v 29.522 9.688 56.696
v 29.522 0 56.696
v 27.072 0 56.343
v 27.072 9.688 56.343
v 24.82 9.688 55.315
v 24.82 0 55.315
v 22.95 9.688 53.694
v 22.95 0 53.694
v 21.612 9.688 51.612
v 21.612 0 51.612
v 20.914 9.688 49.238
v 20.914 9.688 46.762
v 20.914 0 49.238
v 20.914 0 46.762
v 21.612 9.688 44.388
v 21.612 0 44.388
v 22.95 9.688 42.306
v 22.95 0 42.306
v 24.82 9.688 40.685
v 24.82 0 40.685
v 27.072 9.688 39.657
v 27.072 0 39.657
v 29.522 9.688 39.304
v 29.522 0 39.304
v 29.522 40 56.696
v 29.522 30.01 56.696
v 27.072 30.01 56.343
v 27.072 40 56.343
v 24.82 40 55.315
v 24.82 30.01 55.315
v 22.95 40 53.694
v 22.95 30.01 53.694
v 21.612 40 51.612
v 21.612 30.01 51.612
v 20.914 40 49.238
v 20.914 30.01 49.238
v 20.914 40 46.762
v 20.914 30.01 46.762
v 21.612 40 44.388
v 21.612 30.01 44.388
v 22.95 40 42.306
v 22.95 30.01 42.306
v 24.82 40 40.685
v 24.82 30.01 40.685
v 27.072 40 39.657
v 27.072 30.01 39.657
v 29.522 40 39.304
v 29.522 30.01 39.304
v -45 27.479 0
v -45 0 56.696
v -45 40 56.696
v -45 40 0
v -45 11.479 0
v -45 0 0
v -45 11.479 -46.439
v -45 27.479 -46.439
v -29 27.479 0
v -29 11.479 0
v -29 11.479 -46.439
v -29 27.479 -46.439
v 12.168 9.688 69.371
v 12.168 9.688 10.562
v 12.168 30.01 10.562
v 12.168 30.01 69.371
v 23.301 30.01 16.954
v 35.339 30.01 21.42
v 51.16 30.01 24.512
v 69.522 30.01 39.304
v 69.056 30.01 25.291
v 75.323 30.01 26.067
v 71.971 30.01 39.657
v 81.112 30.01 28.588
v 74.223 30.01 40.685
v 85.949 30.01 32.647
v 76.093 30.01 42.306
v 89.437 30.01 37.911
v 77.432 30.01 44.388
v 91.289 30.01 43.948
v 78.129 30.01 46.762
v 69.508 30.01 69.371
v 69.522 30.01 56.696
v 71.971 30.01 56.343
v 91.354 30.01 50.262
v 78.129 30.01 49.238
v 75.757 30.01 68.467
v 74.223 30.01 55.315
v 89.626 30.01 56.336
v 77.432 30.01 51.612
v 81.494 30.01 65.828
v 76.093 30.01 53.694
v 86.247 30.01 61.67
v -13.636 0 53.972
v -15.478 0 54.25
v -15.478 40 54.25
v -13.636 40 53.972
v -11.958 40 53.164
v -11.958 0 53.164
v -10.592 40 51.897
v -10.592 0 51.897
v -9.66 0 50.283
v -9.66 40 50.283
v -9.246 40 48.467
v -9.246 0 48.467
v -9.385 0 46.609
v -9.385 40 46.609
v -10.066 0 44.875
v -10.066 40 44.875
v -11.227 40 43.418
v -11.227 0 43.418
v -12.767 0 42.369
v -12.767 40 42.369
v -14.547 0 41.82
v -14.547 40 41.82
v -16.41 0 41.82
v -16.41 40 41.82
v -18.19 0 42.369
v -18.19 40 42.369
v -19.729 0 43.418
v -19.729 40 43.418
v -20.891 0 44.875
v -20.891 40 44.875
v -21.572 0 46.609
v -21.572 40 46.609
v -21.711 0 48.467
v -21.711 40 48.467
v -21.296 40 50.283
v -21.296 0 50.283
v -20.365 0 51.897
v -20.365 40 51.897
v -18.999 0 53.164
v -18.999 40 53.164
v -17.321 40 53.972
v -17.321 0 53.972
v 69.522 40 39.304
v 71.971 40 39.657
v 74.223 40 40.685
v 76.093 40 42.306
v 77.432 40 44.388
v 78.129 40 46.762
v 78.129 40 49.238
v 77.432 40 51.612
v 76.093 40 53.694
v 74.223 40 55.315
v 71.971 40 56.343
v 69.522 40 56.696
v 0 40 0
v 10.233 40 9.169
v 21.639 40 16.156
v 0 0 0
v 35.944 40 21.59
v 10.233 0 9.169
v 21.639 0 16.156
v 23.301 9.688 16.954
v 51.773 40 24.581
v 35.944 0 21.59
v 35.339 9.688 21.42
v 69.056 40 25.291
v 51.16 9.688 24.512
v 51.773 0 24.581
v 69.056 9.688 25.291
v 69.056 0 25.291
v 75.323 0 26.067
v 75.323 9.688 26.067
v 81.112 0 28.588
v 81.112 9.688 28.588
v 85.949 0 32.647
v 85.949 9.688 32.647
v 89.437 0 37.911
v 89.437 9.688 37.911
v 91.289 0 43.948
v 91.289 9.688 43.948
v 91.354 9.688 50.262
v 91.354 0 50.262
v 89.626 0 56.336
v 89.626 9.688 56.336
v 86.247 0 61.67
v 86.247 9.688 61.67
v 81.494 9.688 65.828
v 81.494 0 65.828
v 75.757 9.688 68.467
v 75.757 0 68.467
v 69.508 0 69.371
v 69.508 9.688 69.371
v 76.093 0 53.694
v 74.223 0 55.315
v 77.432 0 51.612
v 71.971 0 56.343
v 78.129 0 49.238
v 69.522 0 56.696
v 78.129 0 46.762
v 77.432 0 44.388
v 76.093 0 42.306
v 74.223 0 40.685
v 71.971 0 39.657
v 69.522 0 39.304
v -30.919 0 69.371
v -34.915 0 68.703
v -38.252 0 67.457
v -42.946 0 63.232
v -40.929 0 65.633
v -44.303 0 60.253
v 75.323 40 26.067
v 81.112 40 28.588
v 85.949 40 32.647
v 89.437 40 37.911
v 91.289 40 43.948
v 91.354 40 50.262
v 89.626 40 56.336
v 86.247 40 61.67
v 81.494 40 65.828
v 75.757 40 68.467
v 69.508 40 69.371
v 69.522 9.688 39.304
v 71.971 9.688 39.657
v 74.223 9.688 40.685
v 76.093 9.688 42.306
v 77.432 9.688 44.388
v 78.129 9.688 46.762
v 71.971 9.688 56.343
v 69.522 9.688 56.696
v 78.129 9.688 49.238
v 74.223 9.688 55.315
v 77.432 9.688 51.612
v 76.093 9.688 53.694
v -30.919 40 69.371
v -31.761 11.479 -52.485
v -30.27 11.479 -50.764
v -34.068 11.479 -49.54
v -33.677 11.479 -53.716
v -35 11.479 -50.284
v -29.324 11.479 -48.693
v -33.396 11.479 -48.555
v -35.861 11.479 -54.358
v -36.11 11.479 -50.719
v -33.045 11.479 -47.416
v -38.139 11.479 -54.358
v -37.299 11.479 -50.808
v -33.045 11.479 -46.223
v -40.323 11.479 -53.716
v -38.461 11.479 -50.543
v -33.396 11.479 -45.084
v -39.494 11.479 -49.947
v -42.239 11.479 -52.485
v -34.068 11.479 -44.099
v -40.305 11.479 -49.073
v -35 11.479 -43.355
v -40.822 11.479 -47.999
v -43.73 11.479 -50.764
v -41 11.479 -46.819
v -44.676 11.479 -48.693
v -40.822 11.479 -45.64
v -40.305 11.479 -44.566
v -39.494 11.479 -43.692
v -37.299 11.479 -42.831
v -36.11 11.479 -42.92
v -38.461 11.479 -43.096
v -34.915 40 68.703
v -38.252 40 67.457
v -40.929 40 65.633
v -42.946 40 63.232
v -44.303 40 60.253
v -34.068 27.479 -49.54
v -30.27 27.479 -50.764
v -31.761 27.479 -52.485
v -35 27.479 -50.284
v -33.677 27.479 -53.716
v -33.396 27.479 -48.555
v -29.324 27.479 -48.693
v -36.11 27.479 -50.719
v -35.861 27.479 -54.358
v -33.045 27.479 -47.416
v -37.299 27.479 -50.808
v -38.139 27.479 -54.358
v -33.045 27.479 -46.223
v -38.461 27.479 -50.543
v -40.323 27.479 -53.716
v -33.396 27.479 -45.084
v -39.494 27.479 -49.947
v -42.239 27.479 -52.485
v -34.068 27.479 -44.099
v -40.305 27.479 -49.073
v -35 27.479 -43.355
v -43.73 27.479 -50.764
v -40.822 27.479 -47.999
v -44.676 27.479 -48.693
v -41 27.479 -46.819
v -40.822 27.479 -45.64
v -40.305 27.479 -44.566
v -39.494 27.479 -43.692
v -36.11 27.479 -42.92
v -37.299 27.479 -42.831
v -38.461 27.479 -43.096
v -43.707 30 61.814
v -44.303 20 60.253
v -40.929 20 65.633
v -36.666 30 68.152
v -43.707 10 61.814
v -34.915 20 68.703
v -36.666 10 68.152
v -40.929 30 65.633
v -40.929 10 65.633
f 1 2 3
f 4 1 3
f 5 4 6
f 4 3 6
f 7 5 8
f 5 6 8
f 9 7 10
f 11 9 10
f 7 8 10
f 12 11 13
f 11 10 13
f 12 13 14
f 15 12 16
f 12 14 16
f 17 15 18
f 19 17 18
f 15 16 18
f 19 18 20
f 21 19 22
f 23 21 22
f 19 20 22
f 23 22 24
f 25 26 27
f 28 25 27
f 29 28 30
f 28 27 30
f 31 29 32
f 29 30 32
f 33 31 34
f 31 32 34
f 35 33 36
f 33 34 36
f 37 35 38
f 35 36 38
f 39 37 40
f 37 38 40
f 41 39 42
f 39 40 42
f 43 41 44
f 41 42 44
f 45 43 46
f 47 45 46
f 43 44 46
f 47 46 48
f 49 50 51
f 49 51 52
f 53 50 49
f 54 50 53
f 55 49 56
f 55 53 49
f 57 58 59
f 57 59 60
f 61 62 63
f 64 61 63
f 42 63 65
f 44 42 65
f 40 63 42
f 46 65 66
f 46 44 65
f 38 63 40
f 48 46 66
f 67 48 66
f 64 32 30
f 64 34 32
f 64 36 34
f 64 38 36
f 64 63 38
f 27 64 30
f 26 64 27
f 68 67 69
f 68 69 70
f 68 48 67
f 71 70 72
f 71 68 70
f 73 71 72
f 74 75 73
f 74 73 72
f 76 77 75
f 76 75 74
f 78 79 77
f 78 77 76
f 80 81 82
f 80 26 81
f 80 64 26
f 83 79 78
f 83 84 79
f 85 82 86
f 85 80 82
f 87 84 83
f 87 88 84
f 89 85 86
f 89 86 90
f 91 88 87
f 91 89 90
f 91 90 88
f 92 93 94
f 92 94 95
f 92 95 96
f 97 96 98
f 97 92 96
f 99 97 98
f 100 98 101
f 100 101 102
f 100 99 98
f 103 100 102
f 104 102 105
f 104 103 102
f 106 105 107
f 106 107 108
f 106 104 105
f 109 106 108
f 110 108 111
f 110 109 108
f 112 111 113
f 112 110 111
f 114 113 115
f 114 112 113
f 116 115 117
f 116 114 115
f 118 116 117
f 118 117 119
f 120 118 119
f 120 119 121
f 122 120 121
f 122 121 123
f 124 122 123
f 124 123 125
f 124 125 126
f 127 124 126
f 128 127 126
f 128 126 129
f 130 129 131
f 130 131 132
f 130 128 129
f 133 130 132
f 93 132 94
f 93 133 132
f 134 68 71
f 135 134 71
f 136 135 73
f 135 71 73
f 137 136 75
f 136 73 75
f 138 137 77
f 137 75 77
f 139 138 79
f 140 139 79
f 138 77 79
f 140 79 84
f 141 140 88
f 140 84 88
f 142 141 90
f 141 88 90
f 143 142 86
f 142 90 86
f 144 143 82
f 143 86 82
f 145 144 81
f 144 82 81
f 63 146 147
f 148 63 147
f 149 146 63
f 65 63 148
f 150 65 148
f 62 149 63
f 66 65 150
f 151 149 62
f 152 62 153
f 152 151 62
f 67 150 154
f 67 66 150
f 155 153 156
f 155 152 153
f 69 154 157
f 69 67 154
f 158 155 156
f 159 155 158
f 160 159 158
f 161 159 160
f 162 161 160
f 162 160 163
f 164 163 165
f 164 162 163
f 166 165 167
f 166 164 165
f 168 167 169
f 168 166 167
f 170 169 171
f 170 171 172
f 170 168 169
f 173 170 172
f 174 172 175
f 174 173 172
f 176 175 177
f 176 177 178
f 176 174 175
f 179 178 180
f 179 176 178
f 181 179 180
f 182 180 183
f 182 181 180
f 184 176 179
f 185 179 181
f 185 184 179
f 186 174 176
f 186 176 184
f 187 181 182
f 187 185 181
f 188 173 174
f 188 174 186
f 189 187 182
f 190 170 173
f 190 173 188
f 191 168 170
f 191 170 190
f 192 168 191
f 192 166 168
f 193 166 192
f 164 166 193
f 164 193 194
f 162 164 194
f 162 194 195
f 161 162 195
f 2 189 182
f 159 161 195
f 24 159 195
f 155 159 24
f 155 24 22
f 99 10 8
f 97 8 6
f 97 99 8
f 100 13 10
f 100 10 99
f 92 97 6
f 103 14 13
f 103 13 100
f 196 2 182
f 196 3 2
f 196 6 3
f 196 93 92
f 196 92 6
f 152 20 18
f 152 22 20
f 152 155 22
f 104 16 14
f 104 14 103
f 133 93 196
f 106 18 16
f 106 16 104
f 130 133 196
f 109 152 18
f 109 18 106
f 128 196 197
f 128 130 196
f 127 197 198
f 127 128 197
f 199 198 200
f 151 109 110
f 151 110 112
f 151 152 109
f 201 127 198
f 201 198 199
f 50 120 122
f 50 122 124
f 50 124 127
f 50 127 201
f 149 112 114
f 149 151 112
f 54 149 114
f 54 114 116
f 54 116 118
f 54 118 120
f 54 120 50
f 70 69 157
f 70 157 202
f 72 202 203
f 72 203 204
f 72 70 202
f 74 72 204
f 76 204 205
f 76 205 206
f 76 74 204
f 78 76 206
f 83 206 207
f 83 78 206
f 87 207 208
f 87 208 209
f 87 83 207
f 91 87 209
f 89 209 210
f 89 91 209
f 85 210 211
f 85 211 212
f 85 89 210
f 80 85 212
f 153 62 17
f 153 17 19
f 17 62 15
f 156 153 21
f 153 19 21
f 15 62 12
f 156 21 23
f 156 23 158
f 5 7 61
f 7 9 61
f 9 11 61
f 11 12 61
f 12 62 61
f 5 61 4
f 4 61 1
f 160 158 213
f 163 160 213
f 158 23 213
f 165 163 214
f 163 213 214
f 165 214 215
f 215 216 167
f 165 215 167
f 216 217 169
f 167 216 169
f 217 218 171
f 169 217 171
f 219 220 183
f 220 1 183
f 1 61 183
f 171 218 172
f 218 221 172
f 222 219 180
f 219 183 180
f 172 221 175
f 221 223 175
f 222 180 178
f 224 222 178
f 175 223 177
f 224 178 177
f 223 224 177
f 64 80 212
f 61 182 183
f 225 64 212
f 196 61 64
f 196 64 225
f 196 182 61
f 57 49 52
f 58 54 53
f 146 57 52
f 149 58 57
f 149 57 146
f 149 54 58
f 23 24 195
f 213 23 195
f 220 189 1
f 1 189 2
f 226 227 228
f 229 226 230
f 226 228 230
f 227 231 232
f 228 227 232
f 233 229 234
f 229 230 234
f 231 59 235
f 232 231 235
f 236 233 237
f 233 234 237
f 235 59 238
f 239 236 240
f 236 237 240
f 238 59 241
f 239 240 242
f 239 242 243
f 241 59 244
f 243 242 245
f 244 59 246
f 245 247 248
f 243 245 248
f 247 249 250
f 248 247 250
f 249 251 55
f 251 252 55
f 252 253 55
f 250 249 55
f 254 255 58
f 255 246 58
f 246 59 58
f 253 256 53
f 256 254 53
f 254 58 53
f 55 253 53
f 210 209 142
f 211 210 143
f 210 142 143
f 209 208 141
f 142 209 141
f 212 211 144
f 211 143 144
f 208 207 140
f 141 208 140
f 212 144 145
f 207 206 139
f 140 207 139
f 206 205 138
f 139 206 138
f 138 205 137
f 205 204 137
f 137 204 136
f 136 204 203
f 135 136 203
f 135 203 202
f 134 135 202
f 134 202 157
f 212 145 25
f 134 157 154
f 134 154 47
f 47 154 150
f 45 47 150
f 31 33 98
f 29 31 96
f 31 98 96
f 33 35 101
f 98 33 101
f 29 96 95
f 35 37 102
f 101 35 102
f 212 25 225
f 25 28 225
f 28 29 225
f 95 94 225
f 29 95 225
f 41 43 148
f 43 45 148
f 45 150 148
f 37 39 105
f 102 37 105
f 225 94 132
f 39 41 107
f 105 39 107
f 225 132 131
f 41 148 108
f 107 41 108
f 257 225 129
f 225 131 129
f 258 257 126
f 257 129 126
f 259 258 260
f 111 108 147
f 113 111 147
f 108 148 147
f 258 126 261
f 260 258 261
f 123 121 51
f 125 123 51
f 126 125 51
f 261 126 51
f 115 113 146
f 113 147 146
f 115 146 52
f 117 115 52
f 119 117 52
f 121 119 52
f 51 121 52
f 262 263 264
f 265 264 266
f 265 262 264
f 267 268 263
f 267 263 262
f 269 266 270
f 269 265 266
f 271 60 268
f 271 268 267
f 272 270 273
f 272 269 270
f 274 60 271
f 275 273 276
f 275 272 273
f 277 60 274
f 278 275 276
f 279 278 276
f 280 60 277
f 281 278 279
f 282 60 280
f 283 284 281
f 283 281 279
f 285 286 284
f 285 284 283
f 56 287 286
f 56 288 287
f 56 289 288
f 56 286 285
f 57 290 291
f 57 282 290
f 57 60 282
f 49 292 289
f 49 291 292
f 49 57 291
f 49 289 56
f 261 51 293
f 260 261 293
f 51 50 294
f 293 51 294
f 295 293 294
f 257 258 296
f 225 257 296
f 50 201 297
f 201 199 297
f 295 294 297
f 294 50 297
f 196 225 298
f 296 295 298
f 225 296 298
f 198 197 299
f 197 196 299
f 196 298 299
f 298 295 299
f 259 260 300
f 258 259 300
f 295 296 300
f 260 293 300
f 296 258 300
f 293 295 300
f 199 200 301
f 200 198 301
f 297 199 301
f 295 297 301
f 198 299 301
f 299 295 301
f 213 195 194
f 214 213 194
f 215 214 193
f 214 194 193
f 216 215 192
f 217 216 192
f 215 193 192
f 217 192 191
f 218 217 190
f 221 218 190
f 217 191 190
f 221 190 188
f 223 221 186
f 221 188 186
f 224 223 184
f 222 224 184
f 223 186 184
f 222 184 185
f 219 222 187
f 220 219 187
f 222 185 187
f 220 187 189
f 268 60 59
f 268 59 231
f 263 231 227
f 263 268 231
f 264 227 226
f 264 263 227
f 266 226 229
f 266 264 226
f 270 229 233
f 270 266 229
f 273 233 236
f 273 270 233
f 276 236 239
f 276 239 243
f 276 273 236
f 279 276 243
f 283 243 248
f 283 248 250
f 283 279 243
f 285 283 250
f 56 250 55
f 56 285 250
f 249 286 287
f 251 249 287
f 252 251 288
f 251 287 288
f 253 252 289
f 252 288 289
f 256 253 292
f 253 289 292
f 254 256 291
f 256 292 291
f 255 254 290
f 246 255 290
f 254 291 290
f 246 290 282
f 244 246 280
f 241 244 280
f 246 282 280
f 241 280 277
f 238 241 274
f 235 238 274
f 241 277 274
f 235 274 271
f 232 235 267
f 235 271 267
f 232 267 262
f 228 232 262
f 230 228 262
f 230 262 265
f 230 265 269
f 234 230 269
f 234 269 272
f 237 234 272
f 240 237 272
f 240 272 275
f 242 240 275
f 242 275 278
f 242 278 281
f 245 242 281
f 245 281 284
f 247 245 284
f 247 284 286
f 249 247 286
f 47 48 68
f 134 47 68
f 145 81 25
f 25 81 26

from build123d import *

# Parameters (mm, degrees)
SKETCH1_R           = 6.25
BOSS_EXTRUDE1_DEPTH = 40
SKETCH3_W           = 16
SKETCH3_H           = 16
BOSS_EXTRUDE2_DEPTH = 55
SKETCH4_W           = 79.487617275
SKETCH4_H           = 20.321855451
CUT_EXTRUDE1_DEPTH  = 60.08
CUT_EXTRUDE2_DEPTH  = 60.08
SKETCH8_R           = 4
CUT_EXTRUDE3_DEPTH  = 60.08


with BuildPart() as part:
    # Sketch1 → Boss-Extrude1 (new body)
    with BuildSketch(Plane(origin=(0, 0, 0), x_dir=(1, 0, 0), z_dir=(0, 1, 0))):
        with BuildLine():
            Line((-45, 0), (0, 0))
            add(Edge.make_bspline(
                [(0, 0), (17.365983088, -18.556062235), (40.507326339, -25.876534392), (69.05598636, -25.291140997)],
                knots=[0, 0, 0, 0, 1, 1, 1, 1], degree=3))
            ThreePointArc((69.05598636, -25.291140997), (91.549113489, -47.102951703), (69.507873161, -69.371305461))
            Line((69.507873161, -69.371305461), (-19.337413001, -69.371305461))
            Line((-19.337413001, -69.371305461), (-30.918760516, -69.371305461))
            add(Edge.make_bspline(
                [(-45, -56.695680455), (-43.898759302, -68.233062502), (-30.918760516, -69.371305461)],
                knots=[0, 0, 0, 1, 1, 1], degree=2))
            Line((-45, -56.695680455), (-45, -50.496042729))
            Line((-45, -50.496042729), (-45, 0))
        make_face()
        with Locations(Location((-15.478366003, -48, 0), (0, 0, 270))):
            Circle(SKETCH1_R, mode=Mode.SUBTRACT)
        with BuildLine():
            Line((29.521633997, -39.304319545), (69.521633997, -39.304319545))
            ThreePointArc((69.521633997, -39.304319545), (78.217314452, -48), (69.521633997, -56.695680455))
            Line((69.521633997, -56.695680455), (29.521633997, -56.695680455))
            ThreePointArc((29.521633997, -56.695680455), (20.825953542, -48), (29.521633997, -39.304319545))
        make_face(mode=Mode.SUBTRACT)
    extrude(amount=BOSS_EXTRUDE1_DEPTH)

    # Sketch3 → Boss-Extrude2 (add)
    with BuildSketch(Plane(origin=(0, 0, 0), x_dir=(-1, 0, 0), z_dir=(0, 0, -1))):
        with Locations((37, 19.479254529)):
            Rectangle(SKETCH3_W, SKETCH3_H)
    extrude(amount=BOSS_EXTRUDE2_DEPTH)

    # Sketch4 → Cut-Extrude1 (cut)
    with BuildSketch(Plane.XY.offset(69.371305461)):
        with Locations((51.911602749, 19.849304399)):
            Rectangle(SKETCH4_W, SKETCH4_H)
    extrude(amount=-CUT_EXTRUDE1_DEPTH, mode=Mode.SUBTRACT)

    # Sketch7 → Cut-Extrude2 (cut)
    with BuildSketch(Plane(origin=(0, 27.479254529, 0), x_dir=(1, 0, 0), z_dir=(0, 1, 0))):
        with BuildLine():
            Line((-45, 46.438944543), (-45, 55))
            Line((-45, 55), (-29, 55))
            Line((-29, 55), (-29, 46.438944543))
            ThreePointArc((-29, 46.438944543), (-37, 54.438944543), (-45, 46.438944543))
        make_face()
    extrude(amount=-CUT_EXTRUDE2_DEPTH, mode=Mode.SUBTRACT)

    # Sketch8 → Cut-Extrude3 (cut)
    with BuildSketch(Plane(origin=(0, 27.479254529, 0), x_dir=(1, 0, 0), z_dir=(0, 1, 0))):
        with Locations(Location((-37, 46.819480791, 0), (0, 0, 180))):
            Circle(SKETCH8_R)
    extrude(amount=-CUT_EXTRUDE3_DEPTH, mode=Mode.SUBTRACT)


solid = part.part
